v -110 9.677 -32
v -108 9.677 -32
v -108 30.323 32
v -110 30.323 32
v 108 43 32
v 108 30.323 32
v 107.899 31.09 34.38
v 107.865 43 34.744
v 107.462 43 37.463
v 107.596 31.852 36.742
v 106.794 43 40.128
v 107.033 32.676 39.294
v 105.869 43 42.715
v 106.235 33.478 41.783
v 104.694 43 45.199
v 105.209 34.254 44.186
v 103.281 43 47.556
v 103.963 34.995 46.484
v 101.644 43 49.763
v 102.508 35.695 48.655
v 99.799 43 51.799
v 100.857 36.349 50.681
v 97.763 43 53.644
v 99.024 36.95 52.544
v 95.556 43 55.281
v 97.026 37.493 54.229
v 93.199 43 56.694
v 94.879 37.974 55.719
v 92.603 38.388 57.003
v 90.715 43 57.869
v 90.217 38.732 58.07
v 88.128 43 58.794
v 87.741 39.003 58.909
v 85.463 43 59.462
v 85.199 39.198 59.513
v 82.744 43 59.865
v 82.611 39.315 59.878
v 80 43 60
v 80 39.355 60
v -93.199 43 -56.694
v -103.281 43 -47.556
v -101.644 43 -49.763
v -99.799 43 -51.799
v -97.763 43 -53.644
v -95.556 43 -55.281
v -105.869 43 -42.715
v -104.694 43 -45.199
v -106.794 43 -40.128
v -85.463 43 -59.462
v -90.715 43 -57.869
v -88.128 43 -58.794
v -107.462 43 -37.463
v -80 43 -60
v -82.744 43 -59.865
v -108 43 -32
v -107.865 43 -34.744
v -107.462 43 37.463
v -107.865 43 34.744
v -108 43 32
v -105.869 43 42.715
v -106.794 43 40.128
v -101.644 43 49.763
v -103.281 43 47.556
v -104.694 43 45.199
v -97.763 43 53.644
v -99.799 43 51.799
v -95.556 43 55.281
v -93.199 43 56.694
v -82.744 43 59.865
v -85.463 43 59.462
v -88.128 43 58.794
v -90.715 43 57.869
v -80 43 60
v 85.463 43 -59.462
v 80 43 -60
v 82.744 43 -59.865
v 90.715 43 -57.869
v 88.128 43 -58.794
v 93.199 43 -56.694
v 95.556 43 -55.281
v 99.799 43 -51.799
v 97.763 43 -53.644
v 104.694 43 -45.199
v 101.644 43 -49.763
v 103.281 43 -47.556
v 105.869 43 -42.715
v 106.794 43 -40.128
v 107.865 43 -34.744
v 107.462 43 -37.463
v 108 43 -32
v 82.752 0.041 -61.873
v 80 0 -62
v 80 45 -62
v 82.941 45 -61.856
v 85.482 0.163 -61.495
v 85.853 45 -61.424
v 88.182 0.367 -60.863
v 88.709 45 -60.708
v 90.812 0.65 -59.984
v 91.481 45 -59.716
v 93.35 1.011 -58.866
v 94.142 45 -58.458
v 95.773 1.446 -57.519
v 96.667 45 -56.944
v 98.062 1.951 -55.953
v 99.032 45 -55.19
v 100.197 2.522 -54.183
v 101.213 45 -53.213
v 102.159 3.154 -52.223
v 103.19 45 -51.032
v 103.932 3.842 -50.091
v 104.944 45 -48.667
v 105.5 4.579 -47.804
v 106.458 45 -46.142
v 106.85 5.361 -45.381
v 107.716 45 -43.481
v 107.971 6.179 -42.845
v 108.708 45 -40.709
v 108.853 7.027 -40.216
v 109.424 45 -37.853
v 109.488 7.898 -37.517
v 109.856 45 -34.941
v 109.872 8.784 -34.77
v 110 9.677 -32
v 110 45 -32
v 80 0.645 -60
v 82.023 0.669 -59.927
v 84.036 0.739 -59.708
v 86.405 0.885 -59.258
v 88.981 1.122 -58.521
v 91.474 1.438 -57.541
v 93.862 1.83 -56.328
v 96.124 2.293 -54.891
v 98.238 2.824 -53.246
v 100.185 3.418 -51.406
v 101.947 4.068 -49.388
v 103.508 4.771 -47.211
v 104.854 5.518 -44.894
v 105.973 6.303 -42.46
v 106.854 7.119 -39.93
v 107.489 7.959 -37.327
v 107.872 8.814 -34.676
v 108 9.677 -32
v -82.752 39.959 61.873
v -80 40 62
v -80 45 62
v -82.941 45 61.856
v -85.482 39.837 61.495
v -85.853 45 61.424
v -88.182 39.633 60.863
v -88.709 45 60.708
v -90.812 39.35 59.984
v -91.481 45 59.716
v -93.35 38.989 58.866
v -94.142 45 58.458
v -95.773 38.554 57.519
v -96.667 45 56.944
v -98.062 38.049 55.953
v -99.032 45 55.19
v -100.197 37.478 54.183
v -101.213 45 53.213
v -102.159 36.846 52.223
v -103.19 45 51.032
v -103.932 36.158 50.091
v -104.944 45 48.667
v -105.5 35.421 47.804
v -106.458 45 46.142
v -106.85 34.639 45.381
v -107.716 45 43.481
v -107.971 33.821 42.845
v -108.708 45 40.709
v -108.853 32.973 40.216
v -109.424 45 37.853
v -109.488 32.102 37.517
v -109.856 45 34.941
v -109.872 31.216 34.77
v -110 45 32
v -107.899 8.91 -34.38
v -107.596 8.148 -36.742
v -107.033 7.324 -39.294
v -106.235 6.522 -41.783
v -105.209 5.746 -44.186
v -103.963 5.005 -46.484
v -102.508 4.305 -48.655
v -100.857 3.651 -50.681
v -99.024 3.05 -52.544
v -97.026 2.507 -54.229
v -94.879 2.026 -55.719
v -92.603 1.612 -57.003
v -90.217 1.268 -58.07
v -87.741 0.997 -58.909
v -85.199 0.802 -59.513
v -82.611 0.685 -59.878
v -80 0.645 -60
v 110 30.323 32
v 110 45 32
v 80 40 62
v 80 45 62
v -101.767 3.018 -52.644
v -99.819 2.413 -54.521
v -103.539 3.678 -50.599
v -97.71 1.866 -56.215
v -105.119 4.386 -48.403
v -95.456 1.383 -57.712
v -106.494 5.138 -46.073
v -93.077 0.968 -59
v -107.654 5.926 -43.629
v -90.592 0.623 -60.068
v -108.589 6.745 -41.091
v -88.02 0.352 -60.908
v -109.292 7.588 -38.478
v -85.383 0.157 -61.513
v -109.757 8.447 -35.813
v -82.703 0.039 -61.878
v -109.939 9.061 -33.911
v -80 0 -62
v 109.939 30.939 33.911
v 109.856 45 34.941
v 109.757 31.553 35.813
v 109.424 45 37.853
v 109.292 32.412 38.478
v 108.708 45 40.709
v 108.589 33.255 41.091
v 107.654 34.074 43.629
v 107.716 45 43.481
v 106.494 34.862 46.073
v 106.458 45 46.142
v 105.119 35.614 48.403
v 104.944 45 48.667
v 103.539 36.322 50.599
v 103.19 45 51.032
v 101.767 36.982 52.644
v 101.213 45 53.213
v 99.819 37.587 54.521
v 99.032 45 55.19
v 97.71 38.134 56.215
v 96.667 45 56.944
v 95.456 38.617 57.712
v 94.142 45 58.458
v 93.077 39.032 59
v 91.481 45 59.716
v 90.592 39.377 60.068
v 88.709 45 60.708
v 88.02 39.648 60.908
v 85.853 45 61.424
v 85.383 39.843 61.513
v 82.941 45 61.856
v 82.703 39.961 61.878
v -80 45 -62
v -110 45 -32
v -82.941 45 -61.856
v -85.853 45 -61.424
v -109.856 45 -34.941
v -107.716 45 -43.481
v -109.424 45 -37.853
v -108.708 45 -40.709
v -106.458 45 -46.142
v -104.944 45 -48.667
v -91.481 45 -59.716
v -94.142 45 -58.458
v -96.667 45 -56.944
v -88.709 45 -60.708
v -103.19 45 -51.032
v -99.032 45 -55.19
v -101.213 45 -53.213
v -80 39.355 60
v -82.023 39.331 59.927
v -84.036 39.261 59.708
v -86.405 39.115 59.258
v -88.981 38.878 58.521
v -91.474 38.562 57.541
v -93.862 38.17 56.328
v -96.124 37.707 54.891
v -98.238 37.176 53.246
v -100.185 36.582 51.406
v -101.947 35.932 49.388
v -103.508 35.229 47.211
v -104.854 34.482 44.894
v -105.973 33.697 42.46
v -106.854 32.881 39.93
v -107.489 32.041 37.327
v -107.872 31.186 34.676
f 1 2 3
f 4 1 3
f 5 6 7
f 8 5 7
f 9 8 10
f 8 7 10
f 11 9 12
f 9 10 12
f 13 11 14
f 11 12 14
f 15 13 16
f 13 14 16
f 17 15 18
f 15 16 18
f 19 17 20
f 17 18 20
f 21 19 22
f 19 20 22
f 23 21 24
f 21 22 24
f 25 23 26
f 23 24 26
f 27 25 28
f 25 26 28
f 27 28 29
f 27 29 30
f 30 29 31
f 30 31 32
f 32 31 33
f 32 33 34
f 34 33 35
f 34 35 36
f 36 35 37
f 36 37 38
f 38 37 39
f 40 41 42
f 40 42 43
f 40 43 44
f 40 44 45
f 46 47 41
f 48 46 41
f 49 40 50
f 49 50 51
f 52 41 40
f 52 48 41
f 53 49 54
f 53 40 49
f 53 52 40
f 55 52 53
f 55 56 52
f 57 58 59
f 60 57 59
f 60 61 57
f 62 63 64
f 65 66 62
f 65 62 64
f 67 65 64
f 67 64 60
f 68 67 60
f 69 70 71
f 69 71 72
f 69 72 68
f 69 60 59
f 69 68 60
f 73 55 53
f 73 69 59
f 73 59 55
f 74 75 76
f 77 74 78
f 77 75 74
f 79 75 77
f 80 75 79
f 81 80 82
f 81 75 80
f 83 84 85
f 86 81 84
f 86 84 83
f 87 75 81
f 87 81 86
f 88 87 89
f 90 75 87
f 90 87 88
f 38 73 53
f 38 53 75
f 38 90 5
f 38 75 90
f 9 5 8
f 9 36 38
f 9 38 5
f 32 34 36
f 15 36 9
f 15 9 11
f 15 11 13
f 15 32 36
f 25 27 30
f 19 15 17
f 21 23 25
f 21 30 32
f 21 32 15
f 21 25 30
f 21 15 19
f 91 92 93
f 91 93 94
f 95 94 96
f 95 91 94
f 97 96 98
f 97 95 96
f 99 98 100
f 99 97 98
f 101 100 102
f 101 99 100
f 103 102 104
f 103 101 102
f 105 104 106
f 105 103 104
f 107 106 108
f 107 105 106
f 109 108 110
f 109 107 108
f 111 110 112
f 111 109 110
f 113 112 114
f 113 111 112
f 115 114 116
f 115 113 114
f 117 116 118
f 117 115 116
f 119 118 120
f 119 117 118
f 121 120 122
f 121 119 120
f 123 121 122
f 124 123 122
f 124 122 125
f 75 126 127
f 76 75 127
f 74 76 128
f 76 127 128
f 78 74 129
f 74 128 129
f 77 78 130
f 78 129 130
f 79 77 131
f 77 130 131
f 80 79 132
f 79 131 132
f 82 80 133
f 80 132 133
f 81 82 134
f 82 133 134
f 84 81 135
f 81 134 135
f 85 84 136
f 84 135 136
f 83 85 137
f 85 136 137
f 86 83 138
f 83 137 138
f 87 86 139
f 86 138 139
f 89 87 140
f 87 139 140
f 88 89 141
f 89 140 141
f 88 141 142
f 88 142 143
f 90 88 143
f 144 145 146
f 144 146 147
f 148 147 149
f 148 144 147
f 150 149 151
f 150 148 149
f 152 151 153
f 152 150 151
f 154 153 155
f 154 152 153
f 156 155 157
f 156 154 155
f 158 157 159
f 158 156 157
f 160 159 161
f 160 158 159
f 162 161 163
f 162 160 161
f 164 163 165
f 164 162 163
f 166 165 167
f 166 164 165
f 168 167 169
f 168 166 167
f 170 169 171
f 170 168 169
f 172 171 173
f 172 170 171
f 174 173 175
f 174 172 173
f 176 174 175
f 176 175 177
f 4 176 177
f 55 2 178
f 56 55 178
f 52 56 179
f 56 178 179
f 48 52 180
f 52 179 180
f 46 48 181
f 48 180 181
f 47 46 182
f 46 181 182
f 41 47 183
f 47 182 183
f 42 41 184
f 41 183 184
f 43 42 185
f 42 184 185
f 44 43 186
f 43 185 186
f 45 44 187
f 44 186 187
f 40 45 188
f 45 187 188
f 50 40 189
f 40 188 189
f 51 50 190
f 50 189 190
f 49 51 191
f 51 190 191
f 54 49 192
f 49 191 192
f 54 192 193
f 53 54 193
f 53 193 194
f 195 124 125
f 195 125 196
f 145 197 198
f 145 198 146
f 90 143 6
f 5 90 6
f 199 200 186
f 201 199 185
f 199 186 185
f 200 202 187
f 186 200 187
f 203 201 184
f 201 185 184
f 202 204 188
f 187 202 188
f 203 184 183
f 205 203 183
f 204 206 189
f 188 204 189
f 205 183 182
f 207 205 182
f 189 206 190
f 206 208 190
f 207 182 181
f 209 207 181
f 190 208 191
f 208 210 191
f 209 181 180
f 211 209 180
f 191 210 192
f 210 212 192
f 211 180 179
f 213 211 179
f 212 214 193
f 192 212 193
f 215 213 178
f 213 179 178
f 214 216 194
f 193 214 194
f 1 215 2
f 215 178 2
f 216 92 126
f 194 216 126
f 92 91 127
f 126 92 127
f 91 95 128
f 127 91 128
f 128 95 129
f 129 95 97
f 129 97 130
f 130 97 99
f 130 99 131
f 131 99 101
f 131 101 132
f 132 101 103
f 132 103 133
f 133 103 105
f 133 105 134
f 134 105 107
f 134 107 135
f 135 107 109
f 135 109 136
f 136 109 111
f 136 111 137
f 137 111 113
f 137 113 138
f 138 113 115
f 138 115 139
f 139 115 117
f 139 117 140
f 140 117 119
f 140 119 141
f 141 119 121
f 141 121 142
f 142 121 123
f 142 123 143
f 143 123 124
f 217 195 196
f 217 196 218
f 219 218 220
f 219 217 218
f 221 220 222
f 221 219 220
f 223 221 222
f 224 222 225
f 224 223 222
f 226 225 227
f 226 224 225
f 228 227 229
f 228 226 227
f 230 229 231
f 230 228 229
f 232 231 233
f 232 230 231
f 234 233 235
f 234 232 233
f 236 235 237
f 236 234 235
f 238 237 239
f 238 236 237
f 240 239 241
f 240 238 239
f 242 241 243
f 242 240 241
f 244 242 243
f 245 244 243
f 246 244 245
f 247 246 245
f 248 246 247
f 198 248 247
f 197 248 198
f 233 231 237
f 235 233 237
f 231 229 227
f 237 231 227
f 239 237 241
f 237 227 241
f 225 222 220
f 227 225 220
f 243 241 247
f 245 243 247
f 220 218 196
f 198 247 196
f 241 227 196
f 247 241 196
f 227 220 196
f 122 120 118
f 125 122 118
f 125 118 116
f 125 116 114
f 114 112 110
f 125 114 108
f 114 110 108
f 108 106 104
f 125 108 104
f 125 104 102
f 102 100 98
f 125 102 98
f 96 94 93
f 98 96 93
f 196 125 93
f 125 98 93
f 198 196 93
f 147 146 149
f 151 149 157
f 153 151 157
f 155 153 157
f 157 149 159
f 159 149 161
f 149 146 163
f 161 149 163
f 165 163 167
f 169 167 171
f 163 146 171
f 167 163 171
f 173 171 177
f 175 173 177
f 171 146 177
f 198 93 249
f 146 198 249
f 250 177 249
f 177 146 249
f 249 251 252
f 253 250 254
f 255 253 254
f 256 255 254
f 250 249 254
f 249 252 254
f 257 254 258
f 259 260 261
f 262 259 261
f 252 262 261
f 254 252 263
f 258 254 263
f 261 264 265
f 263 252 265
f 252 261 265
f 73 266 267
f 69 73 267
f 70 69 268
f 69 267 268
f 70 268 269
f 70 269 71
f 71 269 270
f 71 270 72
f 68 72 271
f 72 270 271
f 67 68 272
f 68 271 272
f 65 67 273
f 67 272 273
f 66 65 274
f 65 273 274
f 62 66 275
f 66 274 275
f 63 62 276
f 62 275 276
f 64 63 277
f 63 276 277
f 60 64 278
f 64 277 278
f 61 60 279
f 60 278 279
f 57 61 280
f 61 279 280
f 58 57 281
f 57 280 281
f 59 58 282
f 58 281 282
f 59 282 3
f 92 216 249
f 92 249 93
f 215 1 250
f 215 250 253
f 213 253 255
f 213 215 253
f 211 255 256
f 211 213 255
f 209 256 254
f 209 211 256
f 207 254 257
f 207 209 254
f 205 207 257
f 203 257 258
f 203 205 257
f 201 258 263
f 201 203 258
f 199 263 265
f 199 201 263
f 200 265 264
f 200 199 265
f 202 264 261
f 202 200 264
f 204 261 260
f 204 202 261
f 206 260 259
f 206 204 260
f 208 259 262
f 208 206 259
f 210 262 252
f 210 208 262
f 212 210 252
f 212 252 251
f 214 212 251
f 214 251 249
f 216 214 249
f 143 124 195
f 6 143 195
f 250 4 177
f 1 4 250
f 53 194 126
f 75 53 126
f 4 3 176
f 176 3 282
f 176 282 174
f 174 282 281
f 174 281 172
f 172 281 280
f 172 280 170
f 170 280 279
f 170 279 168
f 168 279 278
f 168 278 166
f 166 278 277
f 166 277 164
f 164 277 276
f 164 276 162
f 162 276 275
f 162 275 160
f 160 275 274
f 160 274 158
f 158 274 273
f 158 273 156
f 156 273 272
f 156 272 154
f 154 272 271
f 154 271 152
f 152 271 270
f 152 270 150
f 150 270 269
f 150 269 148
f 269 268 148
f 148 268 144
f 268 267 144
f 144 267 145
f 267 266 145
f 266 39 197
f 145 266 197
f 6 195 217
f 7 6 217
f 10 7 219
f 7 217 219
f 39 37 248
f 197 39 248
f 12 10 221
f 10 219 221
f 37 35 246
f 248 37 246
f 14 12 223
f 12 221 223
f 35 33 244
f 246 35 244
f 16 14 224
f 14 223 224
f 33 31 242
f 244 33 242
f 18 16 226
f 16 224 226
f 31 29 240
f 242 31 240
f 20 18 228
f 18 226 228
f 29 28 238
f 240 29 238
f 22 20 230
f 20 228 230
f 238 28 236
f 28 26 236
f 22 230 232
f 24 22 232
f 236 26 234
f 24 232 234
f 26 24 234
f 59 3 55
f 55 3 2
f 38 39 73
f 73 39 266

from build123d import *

# Parameters (mm, degrees)
BOSS_EXTRUDE1_DEPTH = 45
CUT_EXTRUDE2_DEPTH  = 43
CUT_EXTRUDE4_DEPTH  = 264


with BuildPart() as part:
    # Sketch1 → Boss-Extrude1 (new body)
    with BuildSketch(Plane(origin=(0, 0, 0), x_dir=(1, 0, 0), z_dir=(0, 1, 0))):
        with BuildLine():
            Line((-80, 62), (80, 62))
            ThreePointArc((80, 62), (101.213203436, 53.213203436), (110, 32))
            Line((110, 32), (110, -32))
            ThreePointArc((110, -32), (101.213203436, -53.213203436), (80, -62))
            Line((80, -62), (-80, -62))
            ThreePointArc((-80, -62), (-101.213203436, -53.213203436), (-110, -32))
            Line((-110, -32), (-110, 32))
            ThreePointArc((-110, 32), (-101.213203436, 53.213203436), (-80, 62))
        make_face()
    extrude(amount=BOSS_EXTRUDE1_DEPTH)

    # Sketch6 → Cut-Extrude2 (cut)
    with BuildSketch(Plane.XZ):
        with BuildLine():
            Line((80, 60), (-80, 60))
            ThreePointArc((-80, 60), (-99.798989873, 51.798989873), (-108, 32))
            Line((-108, 32), (-108, -32))
            ThreePointArc((-108, -32), (-99.798989873, -51.798989873), (-80, -60))
            Line((-80, -60), (80, -60))
            ThreePointArc((80, -60), (99.798989873, -51.798989873), (108, -32))
            Line((108, -32), (108, 32))
            ThreePointArc((108, 32), (99.798989873, 51.798989873), (80, 60))
        make_face()
    extrude(amount=-CUT_EXTRUDE2_DEPTH, mode=Mode.SUBTRACT)

    # Sketch4 → Cut-Extrude4 (cut)
    with BuildSketch(Plane(origin=(110, 0, 0), x_dir=(0, 0, -1), z_dir=(1, 0, 0))):
        Polygon((-32, 30.322580645), (-62, 40), (-62, 0), (-32, 0), align=None)
        Polygon((32, 9.677419355), (-32, 30.322580645), (-32, 0), (32, 0), align=None)
        Polygon((62, 0), (32, 9.677419355), (32, 0), align=None)
    extrude(amount=-CUT_EXTRUDE4_DEPTH, mode=Mode.SUBTRACT)


solid = part.part
